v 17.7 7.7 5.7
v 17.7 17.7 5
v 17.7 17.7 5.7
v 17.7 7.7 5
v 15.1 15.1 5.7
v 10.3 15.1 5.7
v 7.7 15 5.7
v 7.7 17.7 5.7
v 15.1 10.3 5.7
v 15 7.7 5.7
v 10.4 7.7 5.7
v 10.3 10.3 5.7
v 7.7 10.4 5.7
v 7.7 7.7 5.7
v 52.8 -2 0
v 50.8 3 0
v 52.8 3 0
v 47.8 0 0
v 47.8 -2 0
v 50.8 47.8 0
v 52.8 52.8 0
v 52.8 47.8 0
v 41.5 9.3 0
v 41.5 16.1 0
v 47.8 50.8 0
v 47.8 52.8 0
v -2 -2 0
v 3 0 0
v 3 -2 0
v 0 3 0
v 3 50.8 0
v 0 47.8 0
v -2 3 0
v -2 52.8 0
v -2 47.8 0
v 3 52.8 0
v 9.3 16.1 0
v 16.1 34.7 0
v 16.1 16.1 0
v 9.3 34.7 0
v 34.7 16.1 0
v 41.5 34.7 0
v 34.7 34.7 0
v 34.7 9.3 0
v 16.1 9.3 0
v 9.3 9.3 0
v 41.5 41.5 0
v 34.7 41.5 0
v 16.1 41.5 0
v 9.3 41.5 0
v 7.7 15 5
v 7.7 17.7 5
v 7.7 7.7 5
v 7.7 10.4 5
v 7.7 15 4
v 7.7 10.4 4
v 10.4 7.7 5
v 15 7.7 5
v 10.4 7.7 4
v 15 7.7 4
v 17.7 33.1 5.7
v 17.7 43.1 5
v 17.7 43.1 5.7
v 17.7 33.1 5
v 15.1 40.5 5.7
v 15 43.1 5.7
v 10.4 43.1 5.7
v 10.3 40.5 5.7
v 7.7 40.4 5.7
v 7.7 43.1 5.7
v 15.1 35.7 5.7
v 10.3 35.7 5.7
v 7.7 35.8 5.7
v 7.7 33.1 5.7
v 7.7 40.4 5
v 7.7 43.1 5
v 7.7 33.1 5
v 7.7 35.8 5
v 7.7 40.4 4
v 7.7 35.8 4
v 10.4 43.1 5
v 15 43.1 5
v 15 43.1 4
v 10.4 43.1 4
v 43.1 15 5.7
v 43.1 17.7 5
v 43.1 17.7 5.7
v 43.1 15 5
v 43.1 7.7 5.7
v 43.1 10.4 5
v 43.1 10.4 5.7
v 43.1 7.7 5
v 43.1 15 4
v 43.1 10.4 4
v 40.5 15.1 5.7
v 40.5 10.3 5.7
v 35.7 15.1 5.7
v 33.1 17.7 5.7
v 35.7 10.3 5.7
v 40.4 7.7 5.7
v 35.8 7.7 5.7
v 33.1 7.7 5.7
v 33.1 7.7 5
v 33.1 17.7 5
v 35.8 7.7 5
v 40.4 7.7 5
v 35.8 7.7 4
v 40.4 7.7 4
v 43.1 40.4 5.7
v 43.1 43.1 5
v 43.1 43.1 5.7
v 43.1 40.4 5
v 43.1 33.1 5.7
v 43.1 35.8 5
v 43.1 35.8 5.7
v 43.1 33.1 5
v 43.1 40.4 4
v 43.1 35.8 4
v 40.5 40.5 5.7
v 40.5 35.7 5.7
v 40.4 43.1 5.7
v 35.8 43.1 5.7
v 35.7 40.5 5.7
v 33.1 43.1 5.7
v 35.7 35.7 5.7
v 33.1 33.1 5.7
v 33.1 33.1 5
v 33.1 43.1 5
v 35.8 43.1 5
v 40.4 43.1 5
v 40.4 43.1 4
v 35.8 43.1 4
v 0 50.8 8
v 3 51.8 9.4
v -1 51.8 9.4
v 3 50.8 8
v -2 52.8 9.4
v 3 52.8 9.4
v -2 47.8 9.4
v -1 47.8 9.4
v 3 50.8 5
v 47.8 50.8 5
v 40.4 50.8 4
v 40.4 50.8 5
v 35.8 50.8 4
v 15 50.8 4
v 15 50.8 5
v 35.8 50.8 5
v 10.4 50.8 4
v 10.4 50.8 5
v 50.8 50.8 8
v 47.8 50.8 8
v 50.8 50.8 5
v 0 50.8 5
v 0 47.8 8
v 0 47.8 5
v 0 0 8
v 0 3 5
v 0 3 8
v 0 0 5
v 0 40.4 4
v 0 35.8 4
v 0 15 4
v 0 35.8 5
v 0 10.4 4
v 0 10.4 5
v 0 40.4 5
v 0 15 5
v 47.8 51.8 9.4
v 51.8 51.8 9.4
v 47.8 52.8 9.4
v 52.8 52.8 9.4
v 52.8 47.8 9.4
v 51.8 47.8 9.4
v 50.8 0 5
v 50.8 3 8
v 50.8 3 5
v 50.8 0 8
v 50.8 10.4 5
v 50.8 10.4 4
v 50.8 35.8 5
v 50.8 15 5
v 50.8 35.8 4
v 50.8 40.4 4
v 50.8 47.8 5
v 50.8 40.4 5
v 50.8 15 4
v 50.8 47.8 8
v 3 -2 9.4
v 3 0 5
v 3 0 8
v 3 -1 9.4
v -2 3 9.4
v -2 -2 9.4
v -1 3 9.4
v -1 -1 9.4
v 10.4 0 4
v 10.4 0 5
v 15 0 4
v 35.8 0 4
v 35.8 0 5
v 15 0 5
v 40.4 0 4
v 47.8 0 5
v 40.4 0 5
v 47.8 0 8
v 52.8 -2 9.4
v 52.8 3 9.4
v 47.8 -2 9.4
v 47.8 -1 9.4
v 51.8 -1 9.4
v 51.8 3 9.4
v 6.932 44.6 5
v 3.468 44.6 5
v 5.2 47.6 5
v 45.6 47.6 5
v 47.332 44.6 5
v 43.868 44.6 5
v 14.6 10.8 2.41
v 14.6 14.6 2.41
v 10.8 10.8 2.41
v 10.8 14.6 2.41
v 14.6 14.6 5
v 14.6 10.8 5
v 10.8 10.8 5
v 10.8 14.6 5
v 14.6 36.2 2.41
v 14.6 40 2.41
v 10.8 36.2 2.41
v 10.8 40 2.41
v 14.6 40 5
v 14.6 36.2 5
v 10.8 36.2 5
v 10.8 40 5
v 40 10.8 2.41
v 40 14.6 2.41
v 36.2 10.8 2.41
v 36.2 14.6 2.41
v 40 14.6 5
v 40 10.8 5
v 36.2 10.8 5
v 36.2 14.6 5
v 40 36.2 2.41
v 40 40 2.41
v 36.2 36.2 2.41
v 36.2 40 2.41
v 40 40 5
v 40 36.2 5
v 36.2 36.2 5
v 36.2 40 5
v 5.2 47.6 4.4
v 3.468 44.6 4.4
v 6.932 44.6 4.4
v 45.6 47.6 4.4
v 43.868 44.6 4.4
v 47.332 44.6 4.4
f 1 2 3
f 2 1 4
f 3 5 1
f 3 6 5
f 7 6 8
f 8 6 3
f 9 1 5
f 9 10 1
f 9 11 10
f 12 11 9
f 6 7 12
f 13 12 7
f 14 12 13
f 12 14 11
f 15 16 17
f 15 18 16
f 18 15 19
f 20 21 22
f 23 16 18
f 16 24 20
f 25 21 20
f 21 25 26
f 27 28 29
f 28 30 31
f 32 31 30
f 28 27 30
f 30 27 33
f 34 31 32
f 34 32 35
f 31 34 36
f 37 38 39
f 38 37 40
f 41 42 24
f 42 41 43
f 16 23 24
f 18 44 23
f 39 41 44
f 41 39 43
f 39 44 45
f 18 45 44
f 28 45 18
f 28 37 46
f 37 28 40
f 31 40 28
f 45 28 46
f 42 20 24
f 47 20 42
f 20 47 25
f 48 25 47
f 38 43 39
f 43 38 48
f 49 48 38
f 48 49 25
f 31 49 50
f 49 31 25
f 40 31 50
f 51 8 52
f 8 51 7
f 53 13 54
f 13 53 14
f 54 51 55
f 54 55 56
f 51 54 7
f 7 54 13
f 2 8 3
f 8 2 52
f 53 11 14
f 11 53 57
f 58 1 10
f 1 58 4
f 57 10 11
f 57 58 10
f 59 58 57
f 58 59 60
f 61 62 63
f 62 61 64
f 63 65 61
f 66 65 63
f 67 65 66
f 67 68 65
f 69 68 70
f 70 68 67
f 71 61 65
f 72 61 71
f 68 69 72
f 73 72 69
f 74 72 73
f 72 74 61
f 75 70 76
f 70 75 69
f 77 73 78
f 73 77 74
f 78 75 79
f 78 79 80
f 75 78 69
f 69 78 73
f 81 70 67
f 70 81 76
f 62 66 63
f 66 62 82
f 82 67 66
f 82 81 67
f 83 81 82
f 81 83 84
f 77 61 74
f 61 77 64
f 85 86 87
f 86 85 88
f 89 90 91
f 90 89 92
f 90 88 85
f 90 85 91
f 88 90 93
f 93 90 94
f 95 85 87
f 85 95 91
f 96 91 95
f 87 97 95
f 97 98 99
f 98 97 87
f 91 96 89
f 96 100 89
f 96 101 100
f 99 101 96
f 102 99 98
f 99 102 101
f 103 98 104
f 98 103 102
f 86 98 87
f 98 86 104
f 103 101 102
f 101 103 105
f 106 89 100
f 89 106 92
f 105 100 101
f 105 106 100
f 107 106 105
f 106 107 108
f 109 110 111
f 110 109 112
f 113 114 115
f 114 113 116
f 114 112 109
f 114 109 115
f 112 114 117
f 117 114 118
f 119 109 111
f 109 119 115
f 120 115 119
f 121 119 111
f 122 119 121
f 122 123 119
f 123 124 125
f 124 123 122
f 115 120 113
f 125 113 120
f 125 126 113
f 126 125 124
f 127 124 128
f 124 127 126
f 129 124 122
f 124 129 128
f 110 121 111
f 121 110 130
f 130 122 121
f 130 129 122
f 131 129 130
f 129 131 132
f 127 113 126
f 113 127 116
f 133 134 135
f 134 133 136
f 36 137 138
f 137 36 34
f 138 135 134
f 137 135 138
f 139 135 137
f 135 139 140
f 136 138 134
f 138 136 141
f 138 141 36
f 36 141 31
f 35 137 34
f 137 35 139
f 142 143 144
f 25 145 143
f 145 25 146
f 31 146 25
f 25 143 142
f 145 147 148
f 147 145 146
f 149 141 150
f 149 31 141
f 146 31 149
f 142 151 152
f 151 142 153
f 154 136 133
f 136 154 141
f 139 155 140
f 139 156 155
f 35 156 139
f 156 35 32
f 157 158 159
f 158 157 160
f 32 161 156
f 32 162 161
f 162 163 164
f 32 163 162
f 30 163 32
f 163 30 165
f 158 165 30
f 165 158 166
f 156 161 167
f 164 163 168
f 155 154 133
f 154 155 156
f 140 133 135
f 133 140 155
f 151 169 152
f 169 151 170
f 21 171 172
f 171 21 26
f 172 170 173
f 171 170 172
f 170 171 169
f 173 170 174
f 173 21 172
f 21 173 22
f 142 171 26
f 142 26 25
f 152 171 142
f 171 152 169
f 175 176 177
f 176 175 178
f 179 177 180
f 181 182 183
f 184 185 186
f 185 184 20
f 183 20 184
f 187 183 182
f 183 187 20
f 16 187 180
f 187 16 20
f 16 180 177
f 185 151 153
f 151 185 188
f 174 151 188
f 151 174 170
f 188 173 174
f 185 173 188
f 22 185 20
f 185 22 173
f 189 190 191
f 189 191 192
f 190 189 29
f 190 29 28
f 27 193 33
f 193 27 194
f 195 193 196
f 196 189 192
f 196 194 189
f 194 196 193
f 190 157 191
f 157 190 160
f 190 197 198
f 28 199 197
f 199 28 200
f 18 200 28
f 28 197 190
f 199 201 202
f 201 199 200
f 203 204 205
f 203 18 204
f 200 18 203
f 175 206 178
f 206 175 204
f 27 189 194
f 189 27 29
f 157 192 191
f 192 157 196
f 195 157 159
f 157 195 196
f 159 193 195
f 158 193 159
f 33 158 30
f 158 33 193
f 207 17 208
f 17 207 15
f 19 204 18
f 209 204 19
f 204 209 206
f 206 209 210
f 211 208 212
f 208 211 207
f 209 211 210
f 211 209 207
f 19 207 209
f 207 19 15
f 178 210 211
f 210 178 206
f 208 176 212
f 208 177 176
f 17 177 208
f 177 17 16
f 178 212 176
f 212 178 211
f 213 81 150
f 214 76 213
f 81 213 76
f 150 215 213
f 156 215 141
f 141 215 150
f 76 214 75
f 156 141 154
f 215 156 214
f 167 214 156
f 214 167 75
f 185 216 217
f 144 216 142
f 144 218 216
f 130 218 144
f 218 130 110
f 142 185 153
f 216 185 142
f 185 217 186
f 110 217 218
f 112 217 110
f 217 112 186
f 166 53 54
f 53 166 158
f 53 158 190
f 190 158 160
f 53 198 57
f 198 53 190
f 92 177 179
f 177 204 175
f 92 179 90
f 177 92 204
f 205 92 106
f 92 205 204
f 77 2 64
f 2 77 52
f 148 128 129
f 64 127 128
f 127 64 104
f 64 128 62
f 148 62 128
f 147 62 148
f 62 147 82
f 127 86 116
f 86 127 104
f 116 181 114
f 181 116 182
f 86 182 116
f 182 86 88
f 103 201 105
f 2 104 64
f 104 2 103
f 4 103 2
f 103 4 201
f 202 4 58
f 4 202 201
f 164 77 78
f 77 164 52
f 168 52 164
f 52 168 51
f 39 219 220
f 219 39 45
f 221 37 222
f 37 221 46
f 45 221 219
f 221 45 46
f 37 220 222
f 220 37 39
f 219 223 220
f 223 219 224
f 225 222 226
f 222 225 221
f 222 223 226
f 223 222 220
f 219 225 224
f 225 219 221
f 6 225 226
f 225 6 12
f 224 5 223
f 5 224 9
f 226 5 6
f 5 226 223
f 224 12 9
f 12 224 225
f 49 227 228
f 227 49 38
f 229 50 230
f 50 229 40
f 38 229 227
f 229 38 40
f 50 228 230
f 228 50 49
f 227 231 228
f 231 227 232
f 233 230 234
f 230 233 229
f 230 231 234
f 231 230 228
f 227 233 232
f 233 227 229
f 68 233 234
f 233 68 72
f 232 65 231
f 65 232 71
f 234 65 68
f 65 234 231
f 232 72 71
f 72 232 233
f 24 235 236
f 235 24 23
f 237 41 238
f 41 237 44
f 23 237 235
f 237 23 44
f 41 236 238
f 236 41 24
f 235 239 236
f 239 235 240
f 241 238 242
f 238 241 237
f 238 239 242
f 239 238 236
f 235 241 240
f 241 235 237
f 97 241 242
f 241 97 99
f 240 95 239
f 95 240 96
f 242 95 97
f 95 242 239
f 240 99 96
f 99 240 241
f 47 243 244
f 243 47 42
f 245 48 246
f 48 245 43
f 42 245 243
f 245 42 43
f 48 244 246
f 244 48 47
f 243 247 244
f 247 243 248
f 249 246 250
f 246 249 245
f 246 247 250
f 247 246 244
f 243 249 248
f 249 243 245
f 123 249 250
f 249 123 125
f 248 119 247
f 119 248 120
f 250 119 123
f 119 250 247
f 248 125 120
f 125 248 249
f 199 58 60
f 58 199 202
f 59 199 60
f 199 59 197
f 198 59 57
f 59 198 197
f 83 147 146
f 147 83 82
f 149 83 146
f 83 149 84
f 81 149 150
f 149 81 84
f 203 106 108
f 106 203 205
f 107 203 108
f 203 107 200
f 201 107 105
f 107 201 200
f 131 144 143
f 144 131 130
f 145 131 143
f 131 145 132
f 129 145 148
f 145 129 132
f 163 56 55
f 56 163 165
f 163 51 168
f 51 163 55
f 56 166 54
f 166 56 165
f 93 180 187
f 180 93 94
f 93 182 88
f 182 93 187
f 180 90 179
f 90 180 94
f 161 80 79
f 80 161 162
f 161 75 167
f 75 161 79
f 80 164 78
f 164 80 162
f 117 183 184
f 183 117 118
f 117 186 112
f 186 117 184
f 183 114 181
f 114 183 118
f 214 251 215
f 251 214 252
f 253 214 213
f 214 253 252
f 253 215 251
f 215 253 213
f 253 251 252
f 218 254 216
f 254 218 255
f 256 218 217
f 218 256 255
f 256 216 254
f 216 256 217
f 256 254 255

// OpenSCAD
/*
 * OpenVLex Gluing Stencil v2.3
 */

/* [Base Tile Size] */
x = 2; //[1,2,3,4,5,6,7,8]
y = 2; //[1,2,3,4,5,6,7,8]

/* [Square Basis] */
// What is the size in mm of a square?
square_basis = "inch"; // [25mm:Dwarven Forge/Hirstarts, inch:OpenLOCK/Dragonlock/Dungeonworks, wyloch:Wyloch]

/* [Shape] */
// What type of tile is this for
shape = "square"; // [square,diagonal,curved,alcove]



/*
 * OpenVLex
 */

module openvlex_positive(x,y,square_basis) {

    corner_h = 8;
    corner_h2 = 1.4;
    corner_l = 5;
    corner_w = 2;

    module nwall() {
        hull() {
            cube([corner_l, corner_w, corner_h]);
            translate([0,corner_w/2,corner_h]) cube([corner_l, corner_w/2, corner_h2]);
        }
    }
    module swall() {
        hull() {
            cube([corner_l, corner_w, corner_h]);
            translate([0,0,corner_h]) cube([corner_l, corner_w/2, corner_h2]);
        }
    }
    module ewall() {
        hull() {
            cube([corner_w, corner_l, corner_h]);
            translate([corner_w/2,0,corner_h]) cube([corner_w/2, corner_l, corner_h2]);
        }
    }
    module wwall() {
        hull() {
            cube([corner_w, corner_l, corner_h]);
            translate([0,0,corner_h]) cube([corner_w/2, corner_l, corner_h2]);
        }
    }

  union() {  
    
    
    translate([0,0,0])
        cube([square_basis*x,square_basis*y,5.0]);
    
    plug_sheet_diam = 10;  
      
    for ( i = [0 : x-1] ) {
        for ( j = [0 : y-1] ) {
            translate([i*square_basis, j*square_basis,0])
            translate([square_basis/2-plug_sheet_diam/2, square_basis/2-plug_sheet_diam/2, 0])
            cube([plug_sheet_diam,plug_sheet_diam,5.7]);
           
        }
    }

      
      
    // corners:
    
    //nw
    union() {
        translate([-corner_w,square_basis*y,0]) nwall();
        translate([-corner_w,square_basis*y-corner_l+corner_w,0]) wwall();
    }
    
    //ne
    union() {
        translate([square_basis*x-corner_l+corner_w,square_basis*y,0]) nwall();
        translate([square_basis*x,square_basis*y-corner_l+corner_w,0]) ewall();
    }
    
    //sw
    union() {
        translate([-corner_w,-corner_w,0]) swall();
        translate([-corner_w,-corner_w,0]) wwall();
    }
    
    //se
    union() {
        translate([square_basis*x-corner_l+corner_w,-corner_w,0]) swall();
        translate([square_basis*x,-corner_w,0]) ewall();
    }
  }


}


module openvlex_negative(x,y,square_basis) {
    
    // diameters bottom to top:
    of_bw_d = 6.8;      // bottom widening diameter
    of_bw_y = 0.0;      // bottom widening y
    of_bw_h = 2.4;      // bottom widening height

    of_hole_d = 3.8;    // OpenVLex hole diameter

    of_tw_d = 4.8;      // top widening diameter
    of_tw_y = 5.0;      // top widening y
    of_tw_h = 0.7;      // top widening height
    
    for ( i = [0 : x-1] ) {
        for ( j = [0 : y-1] ) {
            
            // bottom widening:

            translate([i*square_basis, j*square_basis,0])
            translate([square_basis/2-of_bw_d/2, square_basis/2-of_bw_d/2, -0.1])
            hull() {
               translate([(of_bw_d-of_hole_d)/2,(of_bw_d-of_hole_d)/2, of_bw_h + of_bw_y + 0.1])
                  cube([of_hole_d,of_hole_d,0.01]);
               cube([of_bw_d,of_bw_d, of_bw_y +0.1]);
            }

            // plug hole:
            
            translate([i*square_basis, j*square_basis,0])
            translate([square_basis/2-of_hole_d/2, square_basis/2-of_hole_d/2, -0.1])
            cube([of_hole_d,of_hole_d,6 +0.2]);
            
            // top widening:
            
            translate([i*square_basis,j*square_basis,0])
            translate([square_basis/2-of_tw_d/2, square_basis/2-of_tw_d/2, of_tw_y])
            hull() {
               translate([0,0,of_tw_h])
                  cube([of_tw_d,of_tw_d,9]);
               translate([(of_tw_d-of_hole_d)/2,(of_tw_d-of_hole_d)/2,0])
                  cube([of_hole_d,of_hole_d,0.01]);
            }
           
        }
    }

    // chamfers for easier removing:
    chamfer_w = 4.6;
    chamfer_l = square_basis/2 - 10/2;
    chamfer_y = 4;
    
    for ( i = [0 : x-1] ) {
        translate([i*square_basis+square_basis/2-chamfer_w/2, -0.1, chamfer_y])
        cube([chamfer_w,chamfer_l+0.1,6.1]);

        translate([i*square_basis+square_basis/2-chamfer_w/2, square_basis*y-chamfer_l, chamfer_y])
        cube([chamfer_w,chamfer_l+0.1,6.1]);
    }
    
    for ( j = [0 : y-1] ) {
        translate([-0.1, j*square_basis+square_basis/2-chamfer_w/2, chamfer_y])
        cube([chamfer_l+0.1,chamfer_w,6.1]);

        translate([square_basis*x-chamfer_l, j*square_basis+square_basis/2-chamfer_w/2, chamfer_y])
        cube([chamfer_l+0.1,chamfer_w,6.1]);
    }

    // north markers
    marker_size = 4;
    marker_y = 4.4;
    translate([(square_basis/2-chamfer_w/2)/2,
                square_basis*y-square_basis/4+chamfer_w/4,
                marker_y])
    rotate(90)
    cylinder(h=10, r=marker_size/2, center=false, $fn=3);

    translate([square_basis*x - (square_basis/2-chamfer_w/2)/2,
               square_basis*y-square_basis/4+chamfer_w/4,
               marker_y])
    rotate(90)
    cylinder(h=10, r=marker_size/2, center=false, $fn=3);

}


/*
 * Top Level Function
 */
module base(x,y,square_basis) {
    difference() {
        union() {
            openvlex_positive(x,y,square_basis);
        }
        openvlex_negative(x,y,square_basis);
    }
    
}

function keyLookup (data, key) = search(key, data, num_returns_per_match=1)[0];


basis = [
    ["25mm", 25],
    ["inch", 25.4],
    ["wyloch", 31.75]
];
square_basis_number = basis[keyLookup(basis, [square_basis])][1];

color("Orange") 
    base(x,y,square_basis_number);

//color("Orange") 
//  difference() {
//    base(x,y,square_basis_number);
//    translate([
//      square_basis_number-square_basis_number/4,
//      square_basis_number-square_basis_number/4,
//      -0.1])
//    cube([
//      (x-2)*square_basis_number+square_basis_number/2,
//      (y-2)*square_basis_number+square_basis_number/2,
//      20]);
//  }
